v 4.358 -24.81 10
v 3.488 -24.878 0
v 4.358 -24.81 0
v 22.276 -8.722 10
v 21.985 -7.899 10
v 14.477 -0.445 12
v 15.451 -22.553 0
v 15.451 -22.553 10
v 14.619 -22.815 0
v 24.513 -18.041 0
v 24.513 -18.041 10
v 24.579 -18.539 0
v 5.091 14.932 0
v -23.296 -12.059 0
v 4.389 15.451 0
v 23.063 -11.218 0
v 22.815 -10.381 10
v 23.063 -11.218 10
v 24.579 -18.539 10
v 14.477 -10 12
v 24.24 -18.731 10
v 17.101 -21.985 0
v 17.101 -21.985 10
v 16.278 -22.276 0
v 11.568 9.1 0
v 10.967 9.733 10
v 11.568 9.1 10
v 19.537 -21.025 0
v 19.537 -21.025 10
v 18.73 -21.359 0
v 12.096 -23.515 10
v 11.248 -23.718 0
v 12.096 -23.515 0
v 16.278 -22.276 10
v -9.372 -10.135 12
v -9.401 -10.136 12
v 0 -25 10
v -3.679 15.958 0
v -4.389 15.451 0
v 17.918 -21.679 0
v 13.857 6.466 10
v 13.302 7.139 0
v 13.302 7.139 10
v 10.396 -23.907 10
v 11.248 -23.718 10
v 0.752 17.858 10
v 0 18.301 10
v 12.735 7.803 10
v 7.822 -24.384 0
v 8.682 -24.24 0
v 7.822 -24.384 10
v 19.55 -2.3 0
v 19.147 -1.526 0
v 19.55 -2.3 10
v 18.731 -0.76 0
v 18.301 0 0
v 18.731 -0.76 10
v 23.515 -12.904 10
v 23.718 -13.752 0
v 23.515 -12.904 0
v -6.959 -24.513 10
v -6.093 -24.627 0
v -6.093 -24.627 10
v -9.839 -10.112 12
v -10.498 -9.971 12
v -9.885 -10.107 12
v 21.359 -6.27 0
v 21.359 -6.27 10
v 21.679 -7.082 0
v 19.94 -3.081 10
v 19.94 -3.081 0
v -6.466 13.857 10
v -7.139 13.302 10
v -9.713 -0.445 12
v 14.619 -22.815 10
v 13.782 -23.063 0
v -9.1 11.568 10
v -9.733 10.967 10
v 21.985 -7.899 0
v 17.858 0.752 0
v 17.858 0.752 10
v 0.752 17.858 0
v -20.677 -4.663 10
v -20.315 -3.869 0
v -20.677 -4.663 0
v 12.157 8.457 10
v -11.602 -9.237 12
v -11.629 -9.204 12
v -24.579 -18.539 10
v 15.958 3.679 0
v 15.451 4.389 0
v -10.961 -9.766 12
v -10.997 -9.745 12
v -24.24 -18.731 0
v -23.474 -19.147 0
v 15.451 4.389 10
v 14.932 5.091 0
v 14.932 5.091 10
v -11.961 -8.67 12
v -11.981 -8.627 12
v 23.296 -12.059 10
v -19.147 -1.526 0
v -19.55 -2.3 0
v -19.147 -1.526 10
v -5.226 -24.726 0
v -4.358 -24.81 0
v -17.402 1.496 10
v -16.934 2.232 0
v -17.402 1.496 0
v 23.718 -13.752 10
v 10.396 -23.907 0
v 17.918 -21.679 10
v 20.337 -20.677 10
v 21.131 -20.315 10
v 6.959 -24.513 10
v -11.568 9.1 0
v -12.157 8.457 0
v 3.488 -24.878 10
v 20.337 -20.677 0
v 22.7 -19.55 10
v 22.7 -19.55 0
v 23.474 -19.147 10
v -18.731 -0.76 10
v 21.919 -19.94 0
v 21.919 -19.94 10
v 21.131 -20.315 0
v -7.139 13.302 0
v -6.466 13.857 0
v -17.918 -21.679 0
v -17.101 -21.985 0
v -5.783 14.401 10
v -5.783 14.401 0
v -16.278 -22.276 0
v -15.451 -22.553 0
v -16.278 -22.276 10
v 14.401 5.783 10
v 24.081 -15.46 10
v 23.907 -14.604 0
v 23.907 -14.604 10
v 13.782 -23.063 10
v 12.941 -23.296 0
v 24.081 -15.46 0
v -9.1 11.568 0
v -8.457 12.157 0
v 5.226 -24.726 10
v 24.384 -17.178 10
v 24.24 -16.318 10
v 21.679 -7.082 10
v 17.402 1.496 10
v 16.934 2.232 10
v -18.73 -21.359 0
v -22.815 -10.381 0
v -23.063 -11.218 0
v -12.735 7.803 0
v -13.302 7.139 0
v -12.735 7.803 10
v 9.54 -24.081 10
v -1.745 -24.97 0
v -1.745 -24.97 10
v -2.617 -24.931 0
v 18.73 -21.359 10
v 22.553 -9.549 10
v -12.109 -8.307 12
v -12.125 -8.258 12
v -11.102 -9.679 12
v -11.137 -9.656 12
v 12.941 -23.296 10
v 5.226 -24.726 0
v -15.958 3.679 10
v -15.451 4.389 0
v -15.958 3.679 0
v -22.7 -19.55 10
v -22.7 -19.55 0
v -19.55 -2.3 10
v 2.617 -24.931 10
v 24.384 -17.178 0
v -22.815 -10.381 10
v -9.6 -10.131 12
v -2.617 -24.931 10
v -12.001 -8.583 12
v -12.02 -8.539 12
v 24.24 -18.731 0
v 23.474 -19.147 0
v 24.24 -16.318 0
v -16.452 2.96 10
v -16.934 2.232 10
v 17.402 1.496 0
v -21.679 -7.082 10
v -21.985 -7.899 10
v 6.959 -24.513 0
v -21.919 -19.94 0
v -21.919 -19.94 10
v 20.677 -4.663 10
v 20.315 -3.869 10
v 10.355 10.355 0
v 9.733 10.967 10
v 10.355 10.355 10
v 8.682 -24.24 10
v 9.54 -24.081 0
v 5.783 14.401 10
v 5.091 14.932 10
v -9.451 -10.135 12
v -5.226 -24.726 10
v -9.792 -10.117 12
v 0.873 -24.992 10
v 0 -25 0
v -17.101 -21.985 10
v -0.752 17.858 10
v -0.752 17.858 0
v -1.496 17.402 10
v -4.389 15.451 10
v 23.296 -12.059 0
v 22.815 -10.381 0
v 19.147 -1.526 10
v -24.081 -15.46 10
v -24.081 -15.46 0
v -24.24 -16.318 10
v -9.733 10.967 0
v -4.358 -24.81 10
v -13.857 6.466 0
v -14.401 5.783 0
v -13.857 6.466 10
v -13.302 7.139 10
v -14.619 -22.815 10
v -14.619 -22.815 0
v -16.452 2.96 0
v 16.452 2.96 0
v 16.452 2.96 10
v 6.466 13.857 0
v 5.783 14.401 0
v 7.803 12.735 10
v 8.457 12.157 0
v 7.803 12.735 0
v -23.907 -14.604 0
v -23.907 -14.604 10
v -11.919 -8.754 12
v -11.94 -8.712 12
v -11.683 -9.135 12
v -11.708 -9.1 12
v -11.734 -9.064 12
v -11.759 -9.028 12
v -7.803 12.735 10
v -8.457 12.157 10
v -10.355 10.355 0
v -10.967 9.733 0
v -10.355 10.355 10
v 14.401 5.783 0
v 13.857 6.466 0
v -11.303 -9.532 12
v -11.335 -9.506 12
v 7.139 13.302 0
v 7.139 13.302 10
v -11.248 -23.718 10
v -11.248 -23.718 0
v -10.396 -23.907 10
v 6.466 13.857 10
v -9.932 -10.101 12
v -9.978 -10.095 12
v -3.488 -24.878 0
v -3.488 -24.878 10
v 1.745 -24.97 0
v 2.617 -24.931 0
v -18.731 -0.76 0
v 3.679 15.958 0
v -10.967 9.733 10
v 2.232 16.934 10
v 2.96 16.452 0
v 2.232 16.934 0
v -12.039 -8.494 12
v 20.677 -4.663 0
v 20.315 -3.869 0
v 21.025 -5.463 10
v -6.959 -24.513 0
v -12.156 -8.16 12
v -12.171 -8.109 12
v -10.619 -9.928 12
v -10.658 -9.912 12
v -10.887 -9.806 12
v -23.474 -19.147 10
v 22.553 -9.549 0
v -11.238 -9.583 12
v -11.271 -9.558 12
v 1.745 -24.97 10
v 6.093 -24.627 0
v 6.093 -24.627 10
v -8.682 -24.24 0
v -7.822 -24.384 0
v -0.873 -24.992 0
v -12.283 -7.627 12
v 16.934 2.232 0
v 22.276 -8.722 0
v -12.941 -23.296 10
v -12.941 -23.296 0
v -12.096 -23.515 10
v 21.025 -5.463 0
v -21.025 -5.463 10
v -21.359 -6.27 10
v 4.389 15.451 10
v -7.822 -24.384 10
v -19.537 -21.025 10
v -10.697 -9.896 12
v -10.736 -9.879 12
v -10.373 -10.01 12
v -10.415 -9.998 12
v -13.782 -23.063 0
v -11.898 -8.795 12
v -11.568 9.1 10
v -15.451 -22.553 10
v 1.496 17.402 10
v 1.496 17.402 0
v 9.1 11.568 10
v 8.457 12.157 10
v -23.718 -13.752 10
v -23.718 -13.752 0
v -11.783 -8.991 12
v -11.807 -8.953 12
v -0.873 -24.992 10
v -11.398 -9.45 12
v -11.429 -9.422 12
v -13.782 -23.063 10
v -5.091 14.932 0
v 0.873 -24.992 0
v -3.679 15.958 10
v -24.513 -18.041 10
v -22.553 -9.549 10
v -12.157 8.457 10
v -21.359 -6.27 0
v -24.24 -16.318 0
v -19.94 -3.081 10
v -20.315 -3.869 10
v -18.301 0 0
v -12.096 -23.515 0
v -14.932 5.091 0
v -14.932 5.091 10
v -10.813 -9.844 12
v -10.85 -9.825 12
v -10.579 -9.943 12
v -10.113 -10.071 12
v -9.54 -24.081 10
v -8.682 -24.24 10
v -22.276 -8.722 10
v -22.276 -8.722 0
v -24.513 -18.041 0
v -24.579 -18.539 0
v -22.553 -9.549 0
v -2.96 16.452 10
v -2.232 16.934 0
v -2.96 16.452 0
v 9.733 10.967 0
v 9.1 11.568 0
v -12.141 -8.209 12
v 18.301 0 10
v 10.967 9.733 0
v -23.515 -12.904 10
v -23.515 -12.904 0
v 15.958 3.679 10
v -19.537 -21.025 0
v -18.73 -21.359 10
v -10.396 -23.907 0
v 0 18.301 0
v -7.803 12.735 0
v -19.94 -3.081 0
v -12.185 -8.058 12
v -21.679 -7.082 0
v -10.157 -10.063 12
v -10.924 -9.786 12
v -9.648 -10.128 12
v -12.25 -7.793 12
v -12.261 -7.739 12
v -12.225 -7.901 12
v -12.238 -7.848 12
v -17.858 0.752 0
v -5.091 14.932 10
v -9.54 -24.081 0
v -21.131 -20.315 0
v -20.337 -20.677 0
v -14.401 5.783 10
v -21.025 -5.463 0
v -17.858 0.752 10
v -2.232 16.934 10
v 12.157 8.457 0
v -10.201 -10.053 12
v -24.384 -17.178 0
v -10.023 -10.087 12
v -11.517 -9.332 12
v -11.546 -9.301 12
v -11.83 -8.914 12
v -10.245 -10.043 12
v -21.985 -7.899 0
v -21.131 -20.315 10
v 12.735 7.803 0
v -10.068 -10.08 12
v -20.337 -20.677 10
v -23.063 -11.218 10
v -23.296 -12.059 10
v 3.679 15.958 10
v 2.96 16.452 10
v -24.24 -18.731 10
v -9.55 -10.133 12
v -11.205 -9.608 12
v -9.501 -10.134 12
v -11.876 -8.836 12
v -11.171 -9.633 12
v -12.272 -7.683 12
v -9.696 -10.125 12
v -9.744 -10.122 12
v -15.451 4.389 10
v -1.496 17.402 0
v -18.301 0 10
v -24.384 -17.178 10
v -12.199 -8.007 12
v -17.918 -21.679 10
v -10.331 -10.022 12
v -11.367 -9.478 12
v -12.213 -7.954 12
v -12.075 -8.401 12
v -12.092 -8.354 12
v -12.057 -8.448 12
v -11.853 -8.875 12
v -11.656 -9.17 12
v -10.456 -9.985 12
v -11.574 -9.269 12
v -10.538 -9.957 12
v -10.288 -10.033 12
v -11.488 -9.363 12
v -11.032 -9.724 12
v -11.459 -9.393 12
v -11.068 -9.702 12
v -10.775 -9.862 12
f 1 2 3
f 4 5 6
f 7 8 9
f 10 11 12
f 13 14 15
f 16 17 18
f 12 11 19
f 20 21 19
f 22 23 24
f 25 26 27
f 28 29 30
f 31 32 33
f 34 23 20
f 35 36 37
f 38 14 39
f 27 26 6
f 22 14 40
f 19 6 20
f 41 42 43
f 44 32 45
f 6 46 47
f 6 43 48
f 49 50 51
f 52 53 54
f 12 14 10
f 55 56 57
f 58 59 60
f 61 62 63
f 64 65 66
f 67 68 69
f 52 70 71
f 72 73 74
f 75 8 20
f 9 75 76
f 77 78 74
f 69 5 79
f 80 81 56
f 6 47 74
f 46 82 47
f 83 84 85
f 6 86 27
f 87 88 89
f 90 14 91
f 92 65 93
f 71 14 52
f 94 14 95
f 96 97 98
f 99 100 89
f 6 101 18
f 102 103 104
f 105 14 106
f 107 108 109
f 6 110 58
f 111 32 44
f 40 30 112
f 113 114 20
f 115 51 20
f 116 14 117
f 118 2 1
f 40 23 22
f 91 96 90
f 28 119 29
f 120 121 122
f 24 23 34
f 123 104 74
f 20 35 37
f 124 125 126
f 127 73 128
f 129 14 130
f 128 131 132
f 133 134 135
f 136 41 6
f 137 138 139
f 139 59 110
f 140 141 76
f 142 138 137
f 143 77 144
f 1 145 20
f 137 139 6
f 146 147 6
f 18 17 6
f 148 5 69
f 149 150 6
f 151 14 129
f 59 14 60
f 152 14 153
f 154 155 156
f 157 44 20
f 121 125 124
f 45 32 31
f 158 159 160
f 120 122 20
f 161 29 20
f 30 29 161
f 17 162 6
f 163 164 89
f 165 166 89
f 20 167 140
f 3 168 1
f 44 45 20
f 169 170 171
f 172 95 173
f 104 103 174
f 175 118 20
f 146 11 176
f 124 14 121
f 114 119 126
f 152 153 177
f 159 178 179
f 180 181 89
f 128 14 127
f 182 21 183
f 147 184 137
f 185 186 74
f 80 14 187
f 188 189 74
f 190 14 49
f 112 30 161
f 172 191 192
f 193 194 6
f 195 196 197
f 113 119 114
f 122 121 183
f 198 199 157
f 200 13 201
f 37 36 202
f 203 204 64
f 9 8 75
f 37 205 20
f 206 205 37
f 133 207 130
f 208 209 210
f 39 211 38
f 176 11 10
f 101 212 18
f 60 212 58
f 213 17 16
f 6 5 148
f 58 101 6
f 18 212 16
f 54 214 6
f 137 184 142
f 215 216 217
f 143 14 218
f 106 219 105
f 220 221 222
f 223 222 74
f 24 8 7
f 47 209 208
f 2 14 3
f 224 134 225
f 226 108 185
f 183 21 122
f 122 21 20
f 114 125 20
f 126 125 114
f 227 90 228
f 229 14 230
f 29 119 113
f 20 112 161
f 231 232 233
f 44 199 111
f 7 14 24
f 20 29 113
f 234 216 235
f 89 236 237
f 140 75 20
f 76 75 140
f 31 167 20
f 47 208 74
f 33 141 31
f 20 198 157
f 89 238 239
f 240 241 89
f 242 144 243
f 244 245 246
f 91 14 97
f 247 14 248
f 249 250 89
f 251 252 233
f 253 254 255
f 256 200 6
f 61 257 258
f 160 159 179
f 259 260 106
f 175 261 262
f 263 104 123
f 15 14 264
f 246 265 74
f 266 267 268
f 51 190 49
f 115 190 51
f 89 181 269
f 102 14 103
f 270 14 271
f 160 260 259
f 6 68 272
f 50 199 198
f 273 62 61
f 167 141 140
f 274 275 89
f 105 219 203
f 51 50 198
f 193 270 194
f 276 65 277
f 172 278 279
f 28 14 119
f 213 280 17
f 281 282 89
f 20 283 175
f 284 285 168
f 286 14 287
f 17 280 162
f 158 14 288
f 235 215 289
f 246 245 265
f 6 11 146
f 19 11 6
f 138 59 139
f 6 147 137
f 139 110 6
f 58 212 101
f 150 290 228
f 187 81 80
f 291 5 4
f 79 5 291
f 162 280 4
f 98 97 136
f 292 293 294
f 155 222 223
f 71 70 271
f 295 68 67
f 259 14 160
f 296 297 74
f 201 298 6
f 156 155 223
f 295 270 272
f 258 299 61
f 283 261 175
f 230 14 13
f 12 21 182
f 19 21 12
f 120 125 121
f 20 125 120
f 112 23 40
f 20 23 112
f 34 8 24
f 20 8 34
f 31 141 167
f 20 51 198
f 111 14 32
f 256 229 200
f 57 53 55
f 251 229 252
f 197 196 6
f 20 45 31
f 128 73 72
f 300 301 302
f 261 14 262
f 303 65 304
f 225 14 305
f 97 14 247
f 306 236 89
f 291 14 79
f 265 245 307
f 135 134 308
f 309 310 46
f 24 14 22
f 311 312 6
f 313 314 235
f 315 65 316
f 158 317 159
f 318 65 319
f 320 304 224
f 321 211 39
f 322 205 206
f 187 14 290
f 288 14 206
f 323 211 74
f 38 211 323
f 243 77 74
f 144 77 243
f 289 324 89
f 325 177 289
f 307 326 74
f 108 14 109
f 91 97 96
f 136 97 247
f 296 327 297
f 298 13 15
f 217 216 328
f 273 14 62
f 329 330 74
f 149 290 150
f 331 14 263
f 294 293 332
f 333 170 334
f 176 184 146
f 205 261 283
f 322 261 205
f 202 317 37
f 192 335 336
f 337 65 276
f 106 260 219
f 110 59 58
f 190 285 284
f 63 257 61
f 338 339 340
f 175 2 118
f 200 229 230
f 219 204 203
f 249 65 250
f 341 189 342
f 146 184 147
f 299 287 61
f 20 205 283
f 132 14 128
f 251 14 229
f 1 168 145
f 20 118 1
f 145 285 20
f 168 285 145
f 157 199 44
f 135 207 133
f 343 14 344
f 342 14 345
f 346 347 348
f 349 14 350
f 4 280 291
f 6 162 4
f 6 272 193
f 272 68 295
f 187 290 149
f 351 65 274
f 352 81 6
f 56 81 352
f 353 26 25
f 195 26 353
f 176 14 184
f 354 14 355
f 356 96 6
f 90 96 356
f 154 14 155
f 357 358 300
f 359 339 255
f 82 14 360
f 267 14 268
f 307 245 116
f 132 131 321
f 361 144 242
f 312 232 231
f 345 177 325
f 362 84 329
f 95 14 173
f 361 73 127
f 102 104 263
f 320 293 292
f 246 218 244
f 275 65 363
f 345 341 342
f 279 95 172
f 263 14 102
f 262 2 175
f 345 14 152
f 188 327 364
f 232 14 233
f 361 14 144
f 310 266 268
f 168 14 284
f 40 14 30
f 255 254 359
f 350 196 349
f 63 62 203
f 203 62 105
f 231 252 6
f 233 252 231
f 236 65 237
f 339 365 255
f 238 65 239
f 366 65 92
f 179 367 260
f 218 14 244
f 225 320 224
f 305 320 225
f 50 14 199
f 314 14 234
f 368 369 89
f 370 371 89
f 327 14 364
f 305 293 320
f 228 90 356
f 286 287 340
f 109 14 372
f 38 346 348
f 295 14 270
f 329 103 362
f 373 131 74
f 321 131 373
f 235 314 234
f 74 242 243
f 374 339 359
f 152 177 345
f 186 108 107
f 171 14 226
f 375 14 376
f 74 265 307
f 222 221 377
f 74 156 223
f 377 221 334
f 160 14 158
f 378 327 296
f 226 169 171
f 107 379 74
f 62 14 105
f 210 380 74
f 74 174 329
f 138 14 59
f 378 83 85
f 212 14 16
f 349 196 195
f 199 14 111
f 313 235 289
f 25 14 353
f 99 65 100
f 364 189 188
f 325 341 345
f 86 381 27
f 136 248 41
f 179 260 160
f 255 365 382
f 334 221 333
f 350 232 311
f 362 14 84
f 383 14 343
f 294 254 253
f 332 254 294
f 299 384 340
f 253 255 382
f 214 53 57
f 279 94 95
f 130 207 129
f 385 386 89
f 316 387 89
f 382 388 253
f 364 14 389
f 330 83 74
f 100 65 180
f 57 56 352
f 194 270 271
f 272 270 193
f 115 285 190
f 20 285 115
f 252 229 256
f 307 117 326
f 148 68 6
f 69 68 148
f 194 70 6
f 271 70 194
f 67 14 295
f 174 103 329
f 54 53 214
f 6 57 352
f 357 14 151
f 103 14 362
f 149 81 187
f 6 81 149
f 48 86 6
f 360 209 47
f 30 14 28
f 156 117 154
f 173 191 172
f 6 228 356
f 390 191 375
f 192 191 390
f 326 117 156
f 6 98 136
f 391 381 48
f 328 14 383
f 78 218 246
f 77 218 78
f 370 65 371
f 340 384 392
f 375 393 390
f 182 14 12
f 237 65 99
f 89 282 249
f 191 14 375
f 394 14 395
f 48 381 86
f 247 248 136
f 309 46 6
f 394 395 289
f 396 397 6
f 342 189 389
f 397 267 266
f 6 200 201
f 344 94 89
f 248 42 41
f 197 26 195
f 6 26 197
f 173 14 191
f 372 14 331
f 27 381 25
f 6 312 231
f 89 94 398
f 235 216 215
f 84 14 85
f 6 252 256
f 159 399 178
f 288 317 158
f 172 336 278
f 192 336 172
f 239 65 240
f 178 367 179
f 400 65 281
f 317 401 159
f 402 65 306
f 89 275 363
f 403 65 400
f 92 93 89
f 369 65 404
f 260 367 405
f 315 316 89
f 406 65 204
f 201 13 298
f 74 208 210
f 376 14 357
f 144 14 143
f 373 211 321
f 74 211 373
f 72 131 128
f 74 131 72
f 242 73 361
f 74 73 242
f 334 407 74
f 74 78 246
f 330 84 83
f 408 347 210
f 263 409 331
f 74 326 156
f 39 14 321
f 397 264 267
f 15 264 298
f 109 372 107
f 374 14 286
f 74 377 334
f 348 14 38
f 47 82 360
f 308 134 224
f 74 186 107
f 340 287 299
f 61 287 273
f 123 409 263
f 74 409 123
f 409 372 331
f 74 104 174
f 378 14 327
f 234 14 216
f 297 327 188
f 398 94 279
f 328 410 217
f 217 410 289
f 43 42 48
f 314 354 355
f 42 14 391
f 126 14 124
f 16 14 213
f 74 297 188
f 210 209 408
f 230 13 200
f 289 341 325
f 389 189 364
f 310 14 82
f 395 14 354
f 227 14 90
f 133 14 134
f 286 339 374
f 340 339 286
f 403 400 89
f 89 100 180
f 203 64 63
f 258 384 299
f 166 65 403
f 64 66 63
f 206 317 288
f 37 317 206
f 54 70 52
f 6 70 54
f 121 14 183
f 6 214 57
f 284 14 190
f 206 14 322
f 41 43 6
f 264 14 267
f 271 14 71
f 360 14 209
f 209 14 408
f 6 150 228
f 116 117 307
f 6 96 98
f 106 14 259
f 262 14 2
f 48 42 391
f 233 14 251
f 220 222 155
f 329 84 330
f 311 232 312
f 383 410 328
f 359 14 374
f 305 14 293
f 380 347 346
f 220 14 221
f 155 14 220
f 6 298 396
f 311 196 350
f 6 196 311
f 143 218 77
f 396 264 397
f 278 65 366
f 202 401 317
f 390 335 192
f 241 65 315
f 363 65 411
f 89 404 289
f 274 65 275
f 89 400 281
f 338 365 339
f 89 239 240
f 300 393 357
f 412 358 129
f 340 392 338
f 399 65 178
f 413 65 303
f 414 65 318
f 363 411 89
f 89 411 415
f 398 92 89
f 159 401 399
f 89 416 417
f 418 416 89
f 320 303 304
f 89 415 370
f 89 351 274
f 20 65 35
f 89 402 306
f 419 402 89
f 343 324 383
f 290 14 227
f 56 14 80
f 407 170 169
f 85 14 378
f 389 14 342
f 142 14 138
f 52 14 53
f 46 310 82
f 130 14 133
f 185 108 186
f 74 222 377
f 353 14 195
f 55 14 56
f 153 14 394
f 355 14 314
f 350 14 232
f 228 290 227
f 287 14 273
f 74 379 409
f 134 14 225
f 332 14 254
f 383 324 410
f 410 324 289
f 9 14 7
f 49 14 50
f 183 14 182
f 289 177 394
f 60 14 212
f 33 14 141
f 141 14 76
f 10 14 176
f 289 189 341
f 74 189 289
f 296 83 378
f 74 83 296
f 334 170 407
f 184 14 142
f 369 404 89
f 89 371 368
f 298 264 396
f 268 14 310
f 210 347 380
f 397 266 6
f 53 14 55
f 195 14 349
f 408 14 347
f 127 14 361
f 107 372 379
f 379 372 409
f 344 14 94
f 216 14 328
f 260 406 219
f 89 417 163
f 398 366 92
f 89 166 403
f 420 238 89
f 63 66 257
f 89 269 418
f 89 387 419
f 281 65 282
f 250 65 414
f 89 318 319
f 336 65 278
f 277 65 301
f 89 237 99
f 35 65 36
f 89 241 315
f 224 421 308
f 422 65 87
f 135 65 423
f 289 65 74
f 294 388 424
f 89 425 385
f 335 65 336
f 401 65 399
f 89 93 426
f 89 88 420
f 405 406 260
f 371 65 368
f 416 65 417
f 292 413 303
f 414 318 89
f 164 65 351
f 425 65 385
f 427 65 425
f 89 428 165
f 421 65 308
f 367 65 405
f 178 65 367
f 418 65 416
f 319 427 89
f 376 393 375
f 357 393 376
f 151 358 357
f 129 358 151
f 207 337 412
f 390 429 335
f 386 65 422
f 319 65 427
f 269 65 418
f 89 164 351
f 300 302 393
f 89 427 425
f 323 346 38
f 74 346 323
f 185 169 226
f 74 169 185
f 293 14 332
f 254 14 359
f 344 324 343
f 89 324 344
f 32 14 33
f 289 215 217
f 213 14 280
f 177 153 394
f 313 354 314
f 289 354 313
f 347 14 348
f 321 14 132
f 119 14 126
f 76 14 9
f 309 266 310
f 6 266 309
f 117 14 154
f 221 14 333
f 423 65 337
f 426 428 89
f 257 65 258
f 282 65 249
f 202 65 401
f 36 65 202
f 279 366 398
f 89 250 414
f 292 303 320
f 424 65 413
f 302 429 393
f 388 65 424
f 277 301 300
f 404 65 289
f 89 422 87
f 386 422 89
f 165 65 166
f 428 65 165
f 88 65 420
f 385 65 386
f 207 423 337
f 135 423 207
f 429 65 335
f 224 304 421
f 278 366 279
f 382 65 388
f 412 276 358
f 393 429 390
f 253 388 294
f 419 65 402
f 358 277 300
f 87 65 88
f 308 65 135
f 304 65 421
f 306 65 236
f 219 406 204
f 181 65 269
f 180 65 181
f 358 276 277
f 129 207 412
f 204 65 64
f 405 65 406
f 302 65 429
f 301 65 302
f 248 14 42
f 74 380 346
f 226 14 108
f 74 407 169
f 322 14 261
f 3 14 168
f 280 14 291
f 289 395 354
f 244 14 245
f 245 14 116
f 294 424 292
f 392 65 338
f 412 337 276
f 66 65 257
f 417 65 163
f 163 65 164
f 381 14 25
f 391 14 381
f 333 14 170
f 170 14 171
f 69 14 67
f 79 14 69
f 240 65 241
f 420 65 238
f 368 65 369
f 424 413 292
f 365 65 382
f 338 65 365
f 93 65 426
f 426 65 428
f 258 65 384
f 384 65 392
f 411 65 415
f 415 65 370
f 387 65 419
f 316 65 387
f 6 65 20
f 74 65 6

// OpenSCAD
// https://en.wikibooks.org/wiki/OpenSCAD_User_Manual/Other_Language_Features#$fa,_$fs_and_$fn
// minimum angle for a fragment
$fa = 12;
// minimum size of a fragment
$fs = 2;
// When this variable has a value greater than zero,
// the other two variables are ignored and full circle is rendered using this number of fragments.
$fn = 360;

width = 50;


module reuleaux_triangle(width) {
    intersection(){
        translate([0, width/2, 0]) circle(width);
        translate([-width/2, -width/2, 0]) circle(width);
        translate([width/2, -width/2, 0]) circle(width);
    }
}

hull(){
linear_extrude(10)
reuleaux_triangle(width);
translate([-12.5,-10,10]) linear_extrude(2) text("JMH", halign="left", valign="baseline");
}
